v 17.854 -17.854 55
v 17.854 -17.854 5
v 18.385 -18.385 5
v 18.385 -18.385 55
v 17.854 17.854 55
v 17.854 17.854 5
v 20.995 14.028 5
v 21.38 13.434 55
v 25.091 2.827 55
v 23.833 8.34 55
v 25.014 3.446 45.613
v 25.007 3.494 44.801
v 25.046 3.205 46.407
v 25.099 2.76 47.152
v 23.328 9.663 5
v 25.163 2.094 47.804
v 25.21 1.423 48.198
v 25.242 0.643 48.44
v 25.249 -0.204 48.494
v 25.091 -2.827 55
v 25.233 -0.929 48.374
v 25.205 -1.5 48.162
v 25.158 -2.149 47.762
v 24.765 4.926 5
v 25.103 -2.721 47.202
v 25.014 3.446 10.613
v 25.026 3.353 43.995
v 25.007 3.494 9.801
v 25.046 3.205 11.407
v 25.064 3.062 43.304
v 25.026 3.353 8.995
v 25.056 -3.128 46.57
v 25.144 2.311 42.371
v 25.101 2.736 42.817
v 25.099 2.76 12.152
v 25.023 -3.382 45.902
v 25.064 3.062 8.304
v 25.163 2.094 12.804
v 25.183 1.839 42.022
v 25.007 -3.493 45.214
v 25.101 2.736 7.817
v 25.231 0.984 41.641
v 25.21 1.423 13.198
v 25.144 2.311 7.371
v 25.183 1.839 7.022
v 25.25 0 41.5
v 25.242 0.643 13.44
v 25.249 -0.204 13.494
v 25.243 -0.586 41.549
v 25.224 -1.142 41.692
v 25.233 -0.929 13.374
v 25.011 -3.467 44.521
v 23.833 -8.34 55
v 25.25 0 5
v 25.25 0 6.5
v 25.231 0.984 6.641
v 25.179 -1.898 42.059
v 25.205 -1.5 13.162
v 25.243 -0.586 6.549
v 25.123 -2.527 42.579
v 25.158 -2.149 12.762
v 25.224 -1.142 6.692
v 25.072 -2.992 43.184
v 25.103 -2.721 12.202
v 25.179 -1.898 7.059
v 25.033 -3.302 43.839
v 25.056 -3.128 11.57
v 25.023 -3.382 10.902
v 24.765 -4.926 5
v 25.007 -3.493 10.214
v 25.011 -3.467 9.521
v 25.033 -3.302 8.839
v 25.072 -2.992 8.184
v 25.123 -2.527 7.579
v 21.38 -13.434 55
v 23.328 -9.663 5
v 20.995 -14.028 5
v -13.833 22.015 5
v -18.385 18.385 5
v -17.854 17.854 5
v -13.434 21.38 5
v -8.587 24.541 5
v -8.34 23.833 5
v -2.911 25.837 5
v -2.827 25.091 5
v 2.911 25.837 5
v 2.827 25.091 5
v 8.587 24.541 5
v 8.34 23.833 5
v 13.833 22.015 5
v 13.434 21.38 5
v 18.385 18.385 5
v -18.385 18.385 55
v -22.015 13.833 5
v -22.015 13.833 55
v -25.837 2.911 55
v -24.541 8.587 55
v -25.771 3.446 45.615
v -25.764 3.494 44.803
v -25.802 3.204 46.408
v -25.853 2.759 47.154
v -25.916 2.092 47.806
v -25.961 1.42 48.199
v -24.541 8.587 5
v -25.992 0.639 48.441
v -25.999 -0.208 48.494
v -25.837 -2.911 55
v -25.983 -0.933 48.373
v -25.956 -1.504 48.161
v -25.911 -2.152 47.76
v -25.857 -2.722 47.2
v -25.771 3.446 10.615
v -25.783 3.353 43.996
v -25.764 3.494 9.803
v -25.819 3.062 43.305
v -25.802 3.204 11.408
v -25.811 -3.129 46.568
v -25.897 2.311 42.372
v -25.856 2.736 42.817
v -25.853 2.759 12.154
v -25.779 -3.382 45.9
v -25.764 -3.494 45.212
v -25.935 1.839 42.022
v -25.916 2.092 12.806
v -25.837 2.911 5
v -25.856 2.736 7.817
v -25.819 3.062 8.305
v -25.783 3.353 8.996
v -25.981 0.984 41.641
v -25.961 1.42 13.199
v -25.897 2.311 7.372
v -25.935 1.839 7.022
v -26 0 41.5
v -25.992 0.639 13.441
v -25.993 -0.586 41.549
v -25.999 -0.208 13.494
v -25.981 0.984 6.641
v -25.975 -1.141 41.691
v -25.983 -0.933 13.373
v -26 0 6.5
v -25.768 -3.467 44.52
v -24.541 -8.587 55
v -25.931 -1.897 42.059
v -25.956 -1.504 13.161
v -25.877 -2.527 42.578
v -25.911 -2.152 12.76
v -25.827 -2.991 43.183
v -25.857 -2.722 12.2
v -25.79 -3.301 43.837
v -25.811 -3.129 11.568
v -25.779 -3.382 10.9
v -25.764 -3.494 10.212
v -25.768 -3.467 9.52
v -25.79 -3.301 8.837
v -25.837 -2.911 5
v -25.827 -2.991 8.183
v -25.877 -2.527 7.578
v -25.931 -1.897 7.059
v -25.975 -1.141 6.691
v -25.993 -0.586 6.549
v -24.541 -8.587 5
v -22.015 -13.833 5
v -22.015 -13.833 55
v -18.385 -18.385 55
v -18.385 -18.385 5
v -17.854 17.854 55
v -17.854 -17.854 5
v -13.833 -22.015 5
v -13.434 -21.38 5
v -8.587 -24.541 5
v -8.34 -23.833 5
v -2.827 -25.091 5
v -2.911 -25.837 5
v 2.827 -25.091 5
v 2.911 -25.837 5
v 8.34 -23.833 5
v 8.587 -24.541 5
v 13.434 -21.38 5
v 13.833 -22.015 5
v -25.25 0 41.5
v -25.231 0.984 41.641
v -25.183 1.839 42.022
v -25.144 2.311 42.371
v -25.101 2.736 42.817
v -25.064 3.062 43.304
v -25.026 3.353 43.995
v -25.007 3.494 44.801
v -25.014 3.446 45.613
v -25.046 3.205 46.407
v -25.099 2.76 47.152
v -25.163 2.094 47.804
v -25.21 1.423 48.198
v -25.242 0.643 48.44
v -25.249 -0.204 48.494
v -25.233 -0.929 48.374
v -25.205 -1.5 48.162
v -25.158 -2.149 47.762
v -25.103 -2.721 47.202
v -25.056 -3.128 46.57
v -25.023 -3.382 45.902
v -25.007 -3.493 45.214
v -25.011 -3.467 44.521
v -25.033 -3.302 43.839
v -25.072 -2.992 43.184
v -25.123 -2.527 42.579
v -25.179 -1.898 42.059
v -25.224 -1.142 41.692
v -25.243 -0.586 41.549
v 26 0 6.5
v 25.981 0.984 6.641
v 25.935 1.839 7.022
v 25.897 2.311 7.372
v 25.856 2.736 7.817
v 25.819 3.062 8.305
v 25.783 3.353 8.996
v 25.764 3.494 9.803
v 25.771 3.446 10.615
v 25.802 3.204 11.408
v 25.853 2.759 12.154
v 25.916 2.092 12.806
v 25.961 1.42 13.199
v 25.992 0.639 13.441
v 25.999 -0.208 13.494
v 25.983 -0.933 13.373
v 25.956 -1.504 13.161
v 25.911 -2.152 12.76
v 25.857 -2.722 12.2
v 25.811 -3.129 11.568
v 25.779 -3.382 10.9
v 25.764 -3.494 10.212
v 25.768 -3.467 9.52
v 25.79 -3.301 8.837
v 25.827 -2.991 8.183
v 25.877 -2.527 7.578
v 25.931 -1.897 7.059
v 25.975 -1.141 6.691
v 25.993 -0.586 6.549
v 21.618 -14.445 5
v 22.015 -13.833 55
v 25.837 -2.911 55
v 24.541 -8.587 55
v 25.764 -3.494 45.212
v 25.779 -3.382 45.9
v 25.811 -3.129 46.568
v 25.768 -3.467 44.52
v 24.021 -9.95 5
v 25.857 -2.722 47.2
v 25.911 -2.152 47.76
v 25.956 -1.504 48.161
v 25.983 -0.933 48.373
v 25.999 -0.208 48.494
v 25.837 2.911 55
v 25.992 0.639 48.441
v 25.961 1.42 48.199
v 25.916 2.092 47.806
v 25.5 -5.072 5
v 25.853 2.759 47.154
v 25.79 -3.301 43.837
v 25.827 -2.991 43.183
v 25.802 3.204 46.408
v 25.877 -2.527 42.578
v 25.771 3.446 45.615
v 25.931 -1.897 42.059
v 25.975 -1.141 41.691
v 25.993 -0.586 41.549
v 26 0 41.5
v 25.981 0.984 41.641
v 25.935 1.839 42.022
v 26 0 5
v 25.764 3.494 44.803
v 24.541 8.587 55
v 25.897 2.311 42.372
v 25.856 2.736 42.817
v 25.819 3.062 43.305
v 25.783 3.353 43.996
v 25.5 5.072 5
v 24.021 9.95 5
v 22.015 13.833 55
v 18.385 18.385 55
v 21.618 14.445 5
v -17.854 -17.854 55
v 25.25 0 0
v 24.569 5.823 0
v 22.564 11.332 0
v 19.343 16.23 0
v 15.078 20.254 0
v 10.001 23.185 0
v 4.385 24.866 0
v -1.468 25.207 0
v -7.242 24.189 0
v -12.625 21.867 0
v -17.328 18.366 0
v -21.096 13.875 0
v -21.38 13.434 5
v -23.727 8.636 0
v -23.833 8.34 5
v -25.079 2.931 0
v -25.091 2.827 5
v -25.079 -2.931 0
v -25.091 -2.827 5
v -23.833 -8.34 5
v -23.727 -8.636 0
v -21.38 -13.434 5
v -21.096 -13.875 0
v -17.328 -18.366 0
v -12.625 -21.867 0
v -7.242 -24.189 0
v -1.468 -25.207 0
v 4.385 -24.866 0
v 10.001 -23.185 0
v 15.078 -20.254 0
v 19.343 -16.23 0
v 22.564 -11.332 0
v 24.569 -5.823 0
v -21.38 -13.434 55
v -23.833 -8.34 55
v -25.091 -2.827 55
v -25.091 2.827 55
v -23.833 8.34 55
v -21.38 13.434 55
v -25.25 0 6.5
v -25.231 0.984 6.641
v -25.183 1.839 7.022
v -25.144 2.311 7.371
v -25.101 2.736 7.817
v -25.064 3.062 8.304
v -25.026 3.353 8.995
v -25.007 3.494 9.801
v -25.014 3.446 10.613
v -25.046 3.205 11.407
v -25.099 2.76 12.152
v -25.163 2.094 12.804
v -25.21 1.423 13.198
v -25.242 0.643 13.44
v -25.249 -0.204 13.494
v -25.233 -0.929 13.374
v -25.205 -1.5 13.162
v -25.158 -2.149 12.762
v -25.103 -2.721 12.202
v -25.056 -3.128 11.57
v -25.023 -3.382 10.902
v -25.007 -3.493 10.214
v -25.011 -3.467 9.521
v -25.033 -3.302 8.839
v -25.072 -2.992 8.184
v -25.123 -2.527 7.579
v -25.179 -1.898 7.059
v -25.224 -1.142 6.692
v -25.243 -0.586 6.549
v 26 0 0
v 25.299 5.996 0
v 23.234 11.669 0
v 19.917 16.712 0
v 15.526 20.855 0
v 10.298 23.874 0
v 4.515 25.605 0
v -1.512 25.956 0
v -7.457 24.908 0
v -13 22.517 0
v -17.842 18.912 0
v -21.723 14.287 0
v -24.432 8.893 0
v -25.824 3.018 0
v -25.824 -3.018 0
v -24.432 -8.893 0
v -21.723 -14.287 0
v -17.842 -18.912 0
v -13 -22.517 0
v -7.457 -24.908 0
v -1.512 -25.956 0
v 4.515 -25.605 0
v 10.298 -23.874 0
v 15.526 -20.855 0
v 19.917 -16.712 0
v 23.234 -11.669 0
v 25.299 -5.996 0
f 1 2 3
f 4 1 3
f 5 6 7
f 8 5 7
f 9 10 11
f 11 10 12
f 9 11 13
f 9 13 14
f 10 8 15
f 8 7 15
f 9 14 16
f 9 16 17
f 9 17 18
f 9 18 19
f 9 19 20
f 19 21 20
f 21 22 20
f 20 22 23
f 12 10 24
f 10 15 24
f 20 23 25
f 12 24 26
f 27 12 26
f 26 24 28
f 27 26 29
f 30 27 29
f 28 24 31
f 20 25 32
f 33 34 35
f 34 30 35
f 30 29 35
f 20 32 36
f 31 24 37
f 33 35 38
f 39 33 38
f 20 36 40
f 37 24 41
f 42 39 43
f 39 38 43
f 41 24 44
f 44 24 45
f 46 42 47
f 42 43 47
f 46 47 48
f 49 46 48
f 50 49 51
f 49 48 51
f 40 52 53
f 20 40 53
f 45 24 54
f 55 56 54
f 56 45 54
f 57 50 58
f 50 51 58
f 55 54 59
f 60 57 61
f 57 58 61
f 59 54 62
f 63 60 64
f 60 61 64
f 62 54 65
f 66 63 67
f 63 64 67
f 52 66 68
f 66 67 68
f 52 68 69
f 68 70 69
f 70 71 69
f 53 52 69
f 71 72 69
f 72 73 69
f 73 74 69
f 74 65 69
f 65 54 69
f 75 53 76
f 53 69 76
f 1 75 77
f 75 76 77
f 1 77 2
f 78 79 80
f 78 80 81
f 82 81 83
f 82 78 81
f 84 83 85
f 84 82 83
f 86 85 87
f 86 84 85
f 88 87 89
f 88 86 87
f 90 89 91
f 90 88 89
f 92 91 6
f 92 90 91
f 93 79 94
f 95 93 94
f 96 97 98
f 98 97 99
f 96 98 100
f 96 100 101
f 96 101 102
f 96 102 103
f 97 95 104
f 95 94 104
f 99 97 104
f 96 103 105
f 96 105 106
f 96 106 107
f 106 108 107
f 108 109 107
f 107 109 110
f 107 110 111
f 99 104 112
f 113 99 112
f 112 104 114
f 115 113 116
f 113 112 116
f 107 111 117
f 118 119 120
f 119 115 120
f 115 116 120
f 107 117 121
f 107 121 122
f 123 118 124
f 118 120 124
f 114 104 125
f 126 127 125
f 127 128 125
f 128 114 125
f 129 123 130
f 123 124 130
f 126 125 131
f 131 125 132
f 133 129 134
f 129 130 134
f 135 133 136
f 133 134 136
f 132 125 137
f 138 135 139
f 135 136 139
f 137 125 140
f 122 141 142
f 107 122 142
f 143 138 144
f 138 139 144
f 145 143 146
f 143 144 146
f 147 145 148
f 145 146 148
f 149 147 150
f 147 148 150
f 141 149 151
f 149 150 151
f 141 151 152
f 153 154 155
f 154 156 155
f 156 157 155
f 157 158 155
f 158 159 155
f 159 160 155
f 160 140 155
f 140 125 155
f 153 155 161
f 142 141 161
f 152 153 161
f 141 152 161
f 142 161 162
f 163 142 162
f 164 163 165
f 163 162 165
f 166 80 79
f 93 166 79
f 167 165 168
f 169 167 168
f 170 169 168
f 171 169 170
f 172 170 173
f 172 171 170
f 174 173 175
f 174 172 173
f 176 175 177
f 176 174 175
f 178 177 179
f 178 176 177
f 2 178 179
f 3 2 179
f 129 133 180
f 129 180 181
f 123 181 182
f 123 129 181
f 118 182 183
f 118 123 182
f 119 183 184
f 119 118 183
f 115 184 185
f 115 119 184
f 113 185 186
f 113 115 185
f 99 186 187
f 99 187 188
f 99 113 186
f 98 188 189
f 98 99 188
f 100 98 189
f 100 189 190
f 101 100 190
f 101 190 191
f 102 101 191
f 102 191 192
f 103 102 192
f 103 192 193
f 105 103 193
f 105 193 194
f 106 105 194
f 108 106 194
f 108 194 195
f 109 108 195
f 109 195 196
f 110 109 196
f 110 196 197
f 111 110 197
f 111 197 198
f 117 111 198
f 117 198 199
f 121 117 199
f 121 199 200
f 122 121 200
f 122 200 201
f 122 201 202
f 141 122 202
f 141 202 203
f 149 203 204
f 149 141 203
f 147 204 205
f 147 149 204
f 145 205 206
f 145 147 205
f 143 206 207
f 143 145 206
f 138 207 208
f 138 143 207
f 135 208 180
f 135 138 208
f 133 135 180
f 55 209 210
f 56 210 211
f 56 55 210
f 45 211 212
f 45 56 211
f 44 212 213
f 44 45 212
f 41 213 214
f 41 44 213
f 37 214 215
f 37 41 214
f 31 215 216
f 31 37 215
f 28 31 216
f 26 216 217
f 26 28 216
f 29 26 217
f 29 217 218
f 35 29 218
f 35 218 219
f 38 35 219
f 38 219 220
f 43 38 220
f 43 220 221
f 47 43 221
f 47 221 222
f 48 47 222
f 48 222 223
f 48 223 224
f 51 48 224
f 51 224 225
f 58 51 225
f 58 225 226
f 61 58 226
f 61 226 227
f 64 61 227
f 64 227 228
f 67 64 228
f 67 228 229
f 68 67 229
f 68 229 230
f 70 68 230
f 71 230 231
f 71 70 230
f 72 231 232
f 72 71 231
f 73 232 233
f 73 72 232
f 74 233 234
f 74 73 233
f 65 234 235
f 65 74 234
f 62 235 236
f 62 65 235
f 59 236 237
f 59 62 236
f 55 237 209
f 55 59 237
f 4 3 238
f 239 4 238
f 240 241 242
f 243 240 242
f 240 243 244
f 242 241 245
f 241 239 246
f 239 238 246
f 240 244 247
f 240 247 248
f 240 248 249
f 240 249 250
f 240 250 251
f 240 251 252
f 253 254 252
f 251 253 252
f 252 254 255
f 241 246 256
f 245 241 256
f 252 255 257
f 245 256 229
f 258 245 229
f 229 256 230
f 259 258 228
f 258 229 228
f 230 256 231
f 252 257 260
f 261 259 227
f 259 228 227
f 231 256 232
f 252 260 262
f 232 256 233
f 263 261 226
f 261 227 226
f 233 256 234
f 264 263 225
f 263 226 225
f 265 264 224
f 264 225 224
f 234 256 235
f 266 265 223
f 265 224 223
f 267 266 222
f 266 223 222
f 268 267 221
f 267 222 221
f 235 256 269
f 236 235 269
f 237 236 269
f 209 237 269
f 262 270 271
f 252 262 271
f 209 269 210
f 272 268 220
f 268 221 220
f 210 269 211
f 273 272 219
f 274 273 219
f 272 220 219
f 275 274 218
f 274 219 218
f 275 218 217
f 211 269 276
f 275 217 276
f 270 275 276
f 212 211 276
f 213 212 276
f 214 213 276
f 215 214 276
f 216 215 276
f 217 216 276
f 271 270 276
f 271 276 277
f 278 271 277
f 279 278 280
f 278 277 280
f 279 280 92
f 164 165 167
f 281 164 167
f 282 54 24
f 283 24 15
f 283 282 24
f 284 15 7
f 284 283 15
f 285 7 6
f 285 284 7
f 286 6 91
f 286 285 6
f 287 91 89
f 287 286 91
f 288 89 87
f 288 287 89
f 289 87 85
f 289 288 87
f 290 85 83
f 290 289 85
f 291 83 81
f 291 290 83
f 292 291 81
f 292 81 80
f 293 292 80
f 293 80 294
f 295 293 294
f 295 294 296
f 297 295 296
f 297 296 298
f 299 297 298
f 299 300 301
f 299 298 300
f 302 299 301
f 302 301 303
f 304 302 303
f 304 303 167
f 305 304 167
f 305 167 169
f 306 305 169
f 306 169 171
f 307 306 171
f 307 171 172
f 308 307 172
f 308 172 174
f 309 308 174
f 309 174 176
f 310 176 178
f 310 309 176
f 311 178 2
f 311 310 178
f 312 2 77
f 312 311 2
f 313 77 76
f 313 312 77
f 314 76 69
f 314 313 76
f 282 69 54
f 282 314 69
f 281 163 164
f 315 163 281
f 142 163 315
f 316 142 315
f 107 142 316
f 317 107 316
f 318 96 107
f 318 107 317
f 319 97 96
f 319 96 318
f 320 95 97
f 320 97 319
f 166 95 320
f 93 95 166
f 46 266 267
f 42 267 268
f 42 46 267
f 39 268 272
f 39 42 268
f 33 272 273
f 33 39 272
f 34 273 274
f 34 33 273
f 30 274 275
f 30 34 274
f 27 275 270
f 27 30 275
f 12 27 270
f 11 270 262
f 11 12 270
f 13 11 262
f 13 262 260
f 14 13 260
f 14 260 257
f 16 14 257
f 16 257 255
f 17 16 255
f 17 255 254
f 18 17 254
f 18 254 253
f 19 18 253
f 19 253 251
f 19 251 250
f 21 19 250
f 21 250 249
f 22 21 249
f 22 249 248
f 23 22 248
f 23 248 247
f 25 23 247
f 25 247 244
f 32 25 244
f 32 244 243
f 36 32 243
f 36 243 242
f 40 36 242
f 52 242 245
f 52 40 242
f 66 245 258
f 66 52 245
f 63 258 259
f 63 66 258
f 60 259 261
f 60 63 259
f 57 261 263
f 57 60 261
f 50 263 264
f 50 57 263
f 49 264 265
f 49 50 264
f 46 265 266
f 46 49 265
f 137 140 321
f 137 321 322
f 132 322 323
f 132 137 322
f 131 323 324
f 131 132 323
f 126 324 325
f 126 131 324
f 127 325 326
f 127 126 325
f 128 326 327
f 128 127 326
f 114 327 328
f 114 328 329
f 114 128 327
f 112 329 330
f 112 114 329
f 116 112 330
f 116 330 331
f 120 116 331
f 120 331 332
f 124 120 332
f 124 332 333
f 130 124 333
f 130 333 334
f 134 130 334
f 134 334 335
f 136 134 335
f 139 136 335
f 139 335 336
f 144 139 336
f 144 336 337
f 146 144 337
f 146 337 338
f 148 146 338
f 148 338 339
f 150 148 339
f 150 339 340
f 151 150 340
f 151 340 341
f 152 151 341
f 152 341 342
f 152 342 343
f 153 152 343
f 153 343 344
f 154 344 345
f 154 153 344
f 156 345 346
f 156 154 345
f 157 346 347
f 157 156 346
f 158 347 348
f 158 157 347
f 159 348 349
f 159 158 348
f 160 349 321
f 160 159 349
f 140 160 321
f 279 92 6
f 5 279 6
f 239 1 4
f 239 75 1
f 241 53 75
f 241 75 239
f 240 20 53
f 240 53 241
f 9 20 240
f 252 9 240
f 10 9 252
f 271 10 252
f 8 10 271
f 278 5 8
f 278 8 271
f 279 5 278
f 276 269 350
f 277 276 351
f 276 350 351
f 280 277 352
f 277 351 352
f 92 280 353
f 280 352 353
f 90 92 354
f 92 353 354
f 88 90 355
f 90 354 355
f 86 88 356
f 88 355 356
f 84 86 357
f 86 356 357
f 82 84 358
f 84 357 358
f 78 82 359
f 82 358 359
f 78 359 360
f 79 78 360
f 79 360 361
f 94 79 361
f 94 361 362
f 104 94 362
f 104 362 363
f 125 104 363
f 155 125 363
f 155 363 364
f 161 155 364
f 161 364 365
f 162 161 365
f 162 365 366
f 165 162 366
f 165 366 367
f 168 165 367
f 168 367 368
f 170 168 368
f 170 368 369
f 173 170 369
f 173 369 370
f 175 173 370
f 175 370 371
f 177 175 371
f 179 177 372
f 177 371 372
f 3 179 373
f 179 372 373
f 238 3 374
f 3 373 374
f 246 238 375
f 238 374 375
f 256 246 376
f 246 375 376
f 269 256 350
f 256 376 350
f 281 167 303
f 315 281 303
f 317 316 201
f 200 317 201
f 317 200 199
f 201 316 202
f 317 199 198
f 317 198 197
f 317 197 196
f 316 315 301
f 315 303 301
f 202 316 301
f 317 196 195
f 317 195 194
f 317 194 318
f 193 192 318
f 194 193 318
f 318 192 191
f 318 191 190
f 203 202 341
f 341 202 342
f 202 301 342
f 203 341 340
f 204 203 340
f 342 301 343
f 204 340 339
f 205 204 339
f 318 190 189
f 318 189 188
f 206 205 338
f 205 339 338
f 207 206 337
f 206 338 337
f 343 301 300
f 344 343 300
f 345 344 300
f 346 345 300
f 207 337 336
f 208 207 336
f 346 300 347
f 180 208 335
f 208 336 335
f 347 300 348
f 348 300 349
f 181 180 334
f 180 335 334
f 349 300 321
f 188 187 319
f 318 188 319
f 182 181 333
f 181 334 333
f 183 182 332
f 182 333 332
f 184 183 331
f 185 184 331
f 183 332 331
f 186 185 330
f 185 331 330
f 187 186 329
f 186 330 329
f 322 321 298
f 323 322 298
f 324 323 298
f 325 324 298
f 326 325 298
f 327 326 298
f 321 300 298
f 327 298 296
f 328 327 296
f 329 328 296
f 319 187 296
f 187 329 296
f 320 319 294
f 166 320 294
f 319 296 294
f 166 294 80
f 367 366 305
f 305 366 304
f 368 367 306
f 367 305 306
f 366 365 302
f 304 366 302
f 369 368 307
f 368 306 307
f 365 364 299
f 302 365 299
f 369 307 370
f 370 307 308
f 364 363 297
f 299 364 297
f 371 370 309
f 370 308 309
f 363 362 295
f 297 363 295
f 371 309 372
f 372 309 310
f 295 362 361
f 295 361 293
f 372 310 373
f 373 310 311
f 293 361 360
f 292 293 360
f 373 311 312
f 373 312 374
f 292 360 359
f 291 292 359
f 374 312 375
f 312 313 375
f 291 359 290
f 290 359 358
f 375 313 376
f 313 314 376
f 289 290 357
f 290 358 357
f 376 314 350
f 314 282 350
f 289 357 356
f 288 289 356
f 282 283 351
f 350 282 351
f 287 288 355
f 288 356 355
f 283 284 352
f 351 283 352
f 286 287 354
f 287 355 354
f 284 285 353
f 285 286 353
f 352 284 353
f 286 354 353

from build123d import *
from build123d.topology import SkipClean

# Parameters (mm, degrees)
SKETCH2_R               = 26
SKETCH2_R_2             = 25.25
BOSS_EXTRUDE1_DEPTH     = 5
BOSS_EXTRUDE2_DEPTH     = 50
CUT_EXTRUDE1_DEPTH      = 67.158899628
CUT_EXTRUDE1_DEPTH_BACK = 67.158899628
SKETCH4_R               = 3.5


with BuildPart() as part:
    # Sketch2 → Boss-Extrude1 (new body)
    with BuildSketch(Plane.XY):
        Circle(SKETCH2_R)
        Circle(SKETCH2_R_2, mode=Mode.SUBTRACT)
    extrude(amount=BOSS_EXTRUDE1_DEPTH)

    # Sketch3 → Boss-Extrude2 (add)
    with SkipClean():  # the faces are left unmerged after this step: merging them gives an invalid solid
        with BuildSketch(Plane.XY.offset(5)):
            with BuildLine():
                Line((-17.854446225, 17.854446225), (-18.384776311, 18.384776311))
                ThreePointArc((-18.384776311, 18.384776311), (-26, 0), (-18.384776311, -18.384776311))
                Line((-18.384776311, -18.384776311), (-17.854446225, -17.854446225))
                ThreePointArc((-17.854446225, -17.854446225), (-25.25, 0), (-17.854446225, 17.854446225))
            make_face()
            with BuildLine():
                Line((17.854446225, -17.854446225), (18.384776311, -18.384776311))
                ThreePointArc((18.384776311, -18.384776311), (26, 0), (18.384776311, 18.384776311))
                Line((18.384776311, 18.384776311), (17.854446225, 17.854446225))
                ThreePointArc((17.854446225, 17.854446225), (25.25, 0), (17.854446225, -17.854446225))
            make_face()
        extrude(amount=BOSS_EXTRUDE2_DEPTH)

    # Sketch4 → Cut-Extrude1 (cut, two sides: drawn at the far end of the back side and taken through both)
    with SkipClean():  # the faces are left unmerged after this step: merging them gives an invalid solid
        with BuildSketch(Plane(origin=(0, 0, 0), x_dir=(0, 0, -1), z_dir=(1, 0, 0)).offset(-CUT_EXTRUDE1_DEPTH_BACK)):
            with Locations((-45, 0)):
                Circle(SKETCH4_R)
            with Locations((-10, 0)):
                Circle(SKETCH4_R)
        extrude(amount=CUT_EXTRUDE1_DEPTH + CUT_EXTRUDE1_DEPTH_BACK, mode=Mode.SUBTRACT)


solid = part.part
